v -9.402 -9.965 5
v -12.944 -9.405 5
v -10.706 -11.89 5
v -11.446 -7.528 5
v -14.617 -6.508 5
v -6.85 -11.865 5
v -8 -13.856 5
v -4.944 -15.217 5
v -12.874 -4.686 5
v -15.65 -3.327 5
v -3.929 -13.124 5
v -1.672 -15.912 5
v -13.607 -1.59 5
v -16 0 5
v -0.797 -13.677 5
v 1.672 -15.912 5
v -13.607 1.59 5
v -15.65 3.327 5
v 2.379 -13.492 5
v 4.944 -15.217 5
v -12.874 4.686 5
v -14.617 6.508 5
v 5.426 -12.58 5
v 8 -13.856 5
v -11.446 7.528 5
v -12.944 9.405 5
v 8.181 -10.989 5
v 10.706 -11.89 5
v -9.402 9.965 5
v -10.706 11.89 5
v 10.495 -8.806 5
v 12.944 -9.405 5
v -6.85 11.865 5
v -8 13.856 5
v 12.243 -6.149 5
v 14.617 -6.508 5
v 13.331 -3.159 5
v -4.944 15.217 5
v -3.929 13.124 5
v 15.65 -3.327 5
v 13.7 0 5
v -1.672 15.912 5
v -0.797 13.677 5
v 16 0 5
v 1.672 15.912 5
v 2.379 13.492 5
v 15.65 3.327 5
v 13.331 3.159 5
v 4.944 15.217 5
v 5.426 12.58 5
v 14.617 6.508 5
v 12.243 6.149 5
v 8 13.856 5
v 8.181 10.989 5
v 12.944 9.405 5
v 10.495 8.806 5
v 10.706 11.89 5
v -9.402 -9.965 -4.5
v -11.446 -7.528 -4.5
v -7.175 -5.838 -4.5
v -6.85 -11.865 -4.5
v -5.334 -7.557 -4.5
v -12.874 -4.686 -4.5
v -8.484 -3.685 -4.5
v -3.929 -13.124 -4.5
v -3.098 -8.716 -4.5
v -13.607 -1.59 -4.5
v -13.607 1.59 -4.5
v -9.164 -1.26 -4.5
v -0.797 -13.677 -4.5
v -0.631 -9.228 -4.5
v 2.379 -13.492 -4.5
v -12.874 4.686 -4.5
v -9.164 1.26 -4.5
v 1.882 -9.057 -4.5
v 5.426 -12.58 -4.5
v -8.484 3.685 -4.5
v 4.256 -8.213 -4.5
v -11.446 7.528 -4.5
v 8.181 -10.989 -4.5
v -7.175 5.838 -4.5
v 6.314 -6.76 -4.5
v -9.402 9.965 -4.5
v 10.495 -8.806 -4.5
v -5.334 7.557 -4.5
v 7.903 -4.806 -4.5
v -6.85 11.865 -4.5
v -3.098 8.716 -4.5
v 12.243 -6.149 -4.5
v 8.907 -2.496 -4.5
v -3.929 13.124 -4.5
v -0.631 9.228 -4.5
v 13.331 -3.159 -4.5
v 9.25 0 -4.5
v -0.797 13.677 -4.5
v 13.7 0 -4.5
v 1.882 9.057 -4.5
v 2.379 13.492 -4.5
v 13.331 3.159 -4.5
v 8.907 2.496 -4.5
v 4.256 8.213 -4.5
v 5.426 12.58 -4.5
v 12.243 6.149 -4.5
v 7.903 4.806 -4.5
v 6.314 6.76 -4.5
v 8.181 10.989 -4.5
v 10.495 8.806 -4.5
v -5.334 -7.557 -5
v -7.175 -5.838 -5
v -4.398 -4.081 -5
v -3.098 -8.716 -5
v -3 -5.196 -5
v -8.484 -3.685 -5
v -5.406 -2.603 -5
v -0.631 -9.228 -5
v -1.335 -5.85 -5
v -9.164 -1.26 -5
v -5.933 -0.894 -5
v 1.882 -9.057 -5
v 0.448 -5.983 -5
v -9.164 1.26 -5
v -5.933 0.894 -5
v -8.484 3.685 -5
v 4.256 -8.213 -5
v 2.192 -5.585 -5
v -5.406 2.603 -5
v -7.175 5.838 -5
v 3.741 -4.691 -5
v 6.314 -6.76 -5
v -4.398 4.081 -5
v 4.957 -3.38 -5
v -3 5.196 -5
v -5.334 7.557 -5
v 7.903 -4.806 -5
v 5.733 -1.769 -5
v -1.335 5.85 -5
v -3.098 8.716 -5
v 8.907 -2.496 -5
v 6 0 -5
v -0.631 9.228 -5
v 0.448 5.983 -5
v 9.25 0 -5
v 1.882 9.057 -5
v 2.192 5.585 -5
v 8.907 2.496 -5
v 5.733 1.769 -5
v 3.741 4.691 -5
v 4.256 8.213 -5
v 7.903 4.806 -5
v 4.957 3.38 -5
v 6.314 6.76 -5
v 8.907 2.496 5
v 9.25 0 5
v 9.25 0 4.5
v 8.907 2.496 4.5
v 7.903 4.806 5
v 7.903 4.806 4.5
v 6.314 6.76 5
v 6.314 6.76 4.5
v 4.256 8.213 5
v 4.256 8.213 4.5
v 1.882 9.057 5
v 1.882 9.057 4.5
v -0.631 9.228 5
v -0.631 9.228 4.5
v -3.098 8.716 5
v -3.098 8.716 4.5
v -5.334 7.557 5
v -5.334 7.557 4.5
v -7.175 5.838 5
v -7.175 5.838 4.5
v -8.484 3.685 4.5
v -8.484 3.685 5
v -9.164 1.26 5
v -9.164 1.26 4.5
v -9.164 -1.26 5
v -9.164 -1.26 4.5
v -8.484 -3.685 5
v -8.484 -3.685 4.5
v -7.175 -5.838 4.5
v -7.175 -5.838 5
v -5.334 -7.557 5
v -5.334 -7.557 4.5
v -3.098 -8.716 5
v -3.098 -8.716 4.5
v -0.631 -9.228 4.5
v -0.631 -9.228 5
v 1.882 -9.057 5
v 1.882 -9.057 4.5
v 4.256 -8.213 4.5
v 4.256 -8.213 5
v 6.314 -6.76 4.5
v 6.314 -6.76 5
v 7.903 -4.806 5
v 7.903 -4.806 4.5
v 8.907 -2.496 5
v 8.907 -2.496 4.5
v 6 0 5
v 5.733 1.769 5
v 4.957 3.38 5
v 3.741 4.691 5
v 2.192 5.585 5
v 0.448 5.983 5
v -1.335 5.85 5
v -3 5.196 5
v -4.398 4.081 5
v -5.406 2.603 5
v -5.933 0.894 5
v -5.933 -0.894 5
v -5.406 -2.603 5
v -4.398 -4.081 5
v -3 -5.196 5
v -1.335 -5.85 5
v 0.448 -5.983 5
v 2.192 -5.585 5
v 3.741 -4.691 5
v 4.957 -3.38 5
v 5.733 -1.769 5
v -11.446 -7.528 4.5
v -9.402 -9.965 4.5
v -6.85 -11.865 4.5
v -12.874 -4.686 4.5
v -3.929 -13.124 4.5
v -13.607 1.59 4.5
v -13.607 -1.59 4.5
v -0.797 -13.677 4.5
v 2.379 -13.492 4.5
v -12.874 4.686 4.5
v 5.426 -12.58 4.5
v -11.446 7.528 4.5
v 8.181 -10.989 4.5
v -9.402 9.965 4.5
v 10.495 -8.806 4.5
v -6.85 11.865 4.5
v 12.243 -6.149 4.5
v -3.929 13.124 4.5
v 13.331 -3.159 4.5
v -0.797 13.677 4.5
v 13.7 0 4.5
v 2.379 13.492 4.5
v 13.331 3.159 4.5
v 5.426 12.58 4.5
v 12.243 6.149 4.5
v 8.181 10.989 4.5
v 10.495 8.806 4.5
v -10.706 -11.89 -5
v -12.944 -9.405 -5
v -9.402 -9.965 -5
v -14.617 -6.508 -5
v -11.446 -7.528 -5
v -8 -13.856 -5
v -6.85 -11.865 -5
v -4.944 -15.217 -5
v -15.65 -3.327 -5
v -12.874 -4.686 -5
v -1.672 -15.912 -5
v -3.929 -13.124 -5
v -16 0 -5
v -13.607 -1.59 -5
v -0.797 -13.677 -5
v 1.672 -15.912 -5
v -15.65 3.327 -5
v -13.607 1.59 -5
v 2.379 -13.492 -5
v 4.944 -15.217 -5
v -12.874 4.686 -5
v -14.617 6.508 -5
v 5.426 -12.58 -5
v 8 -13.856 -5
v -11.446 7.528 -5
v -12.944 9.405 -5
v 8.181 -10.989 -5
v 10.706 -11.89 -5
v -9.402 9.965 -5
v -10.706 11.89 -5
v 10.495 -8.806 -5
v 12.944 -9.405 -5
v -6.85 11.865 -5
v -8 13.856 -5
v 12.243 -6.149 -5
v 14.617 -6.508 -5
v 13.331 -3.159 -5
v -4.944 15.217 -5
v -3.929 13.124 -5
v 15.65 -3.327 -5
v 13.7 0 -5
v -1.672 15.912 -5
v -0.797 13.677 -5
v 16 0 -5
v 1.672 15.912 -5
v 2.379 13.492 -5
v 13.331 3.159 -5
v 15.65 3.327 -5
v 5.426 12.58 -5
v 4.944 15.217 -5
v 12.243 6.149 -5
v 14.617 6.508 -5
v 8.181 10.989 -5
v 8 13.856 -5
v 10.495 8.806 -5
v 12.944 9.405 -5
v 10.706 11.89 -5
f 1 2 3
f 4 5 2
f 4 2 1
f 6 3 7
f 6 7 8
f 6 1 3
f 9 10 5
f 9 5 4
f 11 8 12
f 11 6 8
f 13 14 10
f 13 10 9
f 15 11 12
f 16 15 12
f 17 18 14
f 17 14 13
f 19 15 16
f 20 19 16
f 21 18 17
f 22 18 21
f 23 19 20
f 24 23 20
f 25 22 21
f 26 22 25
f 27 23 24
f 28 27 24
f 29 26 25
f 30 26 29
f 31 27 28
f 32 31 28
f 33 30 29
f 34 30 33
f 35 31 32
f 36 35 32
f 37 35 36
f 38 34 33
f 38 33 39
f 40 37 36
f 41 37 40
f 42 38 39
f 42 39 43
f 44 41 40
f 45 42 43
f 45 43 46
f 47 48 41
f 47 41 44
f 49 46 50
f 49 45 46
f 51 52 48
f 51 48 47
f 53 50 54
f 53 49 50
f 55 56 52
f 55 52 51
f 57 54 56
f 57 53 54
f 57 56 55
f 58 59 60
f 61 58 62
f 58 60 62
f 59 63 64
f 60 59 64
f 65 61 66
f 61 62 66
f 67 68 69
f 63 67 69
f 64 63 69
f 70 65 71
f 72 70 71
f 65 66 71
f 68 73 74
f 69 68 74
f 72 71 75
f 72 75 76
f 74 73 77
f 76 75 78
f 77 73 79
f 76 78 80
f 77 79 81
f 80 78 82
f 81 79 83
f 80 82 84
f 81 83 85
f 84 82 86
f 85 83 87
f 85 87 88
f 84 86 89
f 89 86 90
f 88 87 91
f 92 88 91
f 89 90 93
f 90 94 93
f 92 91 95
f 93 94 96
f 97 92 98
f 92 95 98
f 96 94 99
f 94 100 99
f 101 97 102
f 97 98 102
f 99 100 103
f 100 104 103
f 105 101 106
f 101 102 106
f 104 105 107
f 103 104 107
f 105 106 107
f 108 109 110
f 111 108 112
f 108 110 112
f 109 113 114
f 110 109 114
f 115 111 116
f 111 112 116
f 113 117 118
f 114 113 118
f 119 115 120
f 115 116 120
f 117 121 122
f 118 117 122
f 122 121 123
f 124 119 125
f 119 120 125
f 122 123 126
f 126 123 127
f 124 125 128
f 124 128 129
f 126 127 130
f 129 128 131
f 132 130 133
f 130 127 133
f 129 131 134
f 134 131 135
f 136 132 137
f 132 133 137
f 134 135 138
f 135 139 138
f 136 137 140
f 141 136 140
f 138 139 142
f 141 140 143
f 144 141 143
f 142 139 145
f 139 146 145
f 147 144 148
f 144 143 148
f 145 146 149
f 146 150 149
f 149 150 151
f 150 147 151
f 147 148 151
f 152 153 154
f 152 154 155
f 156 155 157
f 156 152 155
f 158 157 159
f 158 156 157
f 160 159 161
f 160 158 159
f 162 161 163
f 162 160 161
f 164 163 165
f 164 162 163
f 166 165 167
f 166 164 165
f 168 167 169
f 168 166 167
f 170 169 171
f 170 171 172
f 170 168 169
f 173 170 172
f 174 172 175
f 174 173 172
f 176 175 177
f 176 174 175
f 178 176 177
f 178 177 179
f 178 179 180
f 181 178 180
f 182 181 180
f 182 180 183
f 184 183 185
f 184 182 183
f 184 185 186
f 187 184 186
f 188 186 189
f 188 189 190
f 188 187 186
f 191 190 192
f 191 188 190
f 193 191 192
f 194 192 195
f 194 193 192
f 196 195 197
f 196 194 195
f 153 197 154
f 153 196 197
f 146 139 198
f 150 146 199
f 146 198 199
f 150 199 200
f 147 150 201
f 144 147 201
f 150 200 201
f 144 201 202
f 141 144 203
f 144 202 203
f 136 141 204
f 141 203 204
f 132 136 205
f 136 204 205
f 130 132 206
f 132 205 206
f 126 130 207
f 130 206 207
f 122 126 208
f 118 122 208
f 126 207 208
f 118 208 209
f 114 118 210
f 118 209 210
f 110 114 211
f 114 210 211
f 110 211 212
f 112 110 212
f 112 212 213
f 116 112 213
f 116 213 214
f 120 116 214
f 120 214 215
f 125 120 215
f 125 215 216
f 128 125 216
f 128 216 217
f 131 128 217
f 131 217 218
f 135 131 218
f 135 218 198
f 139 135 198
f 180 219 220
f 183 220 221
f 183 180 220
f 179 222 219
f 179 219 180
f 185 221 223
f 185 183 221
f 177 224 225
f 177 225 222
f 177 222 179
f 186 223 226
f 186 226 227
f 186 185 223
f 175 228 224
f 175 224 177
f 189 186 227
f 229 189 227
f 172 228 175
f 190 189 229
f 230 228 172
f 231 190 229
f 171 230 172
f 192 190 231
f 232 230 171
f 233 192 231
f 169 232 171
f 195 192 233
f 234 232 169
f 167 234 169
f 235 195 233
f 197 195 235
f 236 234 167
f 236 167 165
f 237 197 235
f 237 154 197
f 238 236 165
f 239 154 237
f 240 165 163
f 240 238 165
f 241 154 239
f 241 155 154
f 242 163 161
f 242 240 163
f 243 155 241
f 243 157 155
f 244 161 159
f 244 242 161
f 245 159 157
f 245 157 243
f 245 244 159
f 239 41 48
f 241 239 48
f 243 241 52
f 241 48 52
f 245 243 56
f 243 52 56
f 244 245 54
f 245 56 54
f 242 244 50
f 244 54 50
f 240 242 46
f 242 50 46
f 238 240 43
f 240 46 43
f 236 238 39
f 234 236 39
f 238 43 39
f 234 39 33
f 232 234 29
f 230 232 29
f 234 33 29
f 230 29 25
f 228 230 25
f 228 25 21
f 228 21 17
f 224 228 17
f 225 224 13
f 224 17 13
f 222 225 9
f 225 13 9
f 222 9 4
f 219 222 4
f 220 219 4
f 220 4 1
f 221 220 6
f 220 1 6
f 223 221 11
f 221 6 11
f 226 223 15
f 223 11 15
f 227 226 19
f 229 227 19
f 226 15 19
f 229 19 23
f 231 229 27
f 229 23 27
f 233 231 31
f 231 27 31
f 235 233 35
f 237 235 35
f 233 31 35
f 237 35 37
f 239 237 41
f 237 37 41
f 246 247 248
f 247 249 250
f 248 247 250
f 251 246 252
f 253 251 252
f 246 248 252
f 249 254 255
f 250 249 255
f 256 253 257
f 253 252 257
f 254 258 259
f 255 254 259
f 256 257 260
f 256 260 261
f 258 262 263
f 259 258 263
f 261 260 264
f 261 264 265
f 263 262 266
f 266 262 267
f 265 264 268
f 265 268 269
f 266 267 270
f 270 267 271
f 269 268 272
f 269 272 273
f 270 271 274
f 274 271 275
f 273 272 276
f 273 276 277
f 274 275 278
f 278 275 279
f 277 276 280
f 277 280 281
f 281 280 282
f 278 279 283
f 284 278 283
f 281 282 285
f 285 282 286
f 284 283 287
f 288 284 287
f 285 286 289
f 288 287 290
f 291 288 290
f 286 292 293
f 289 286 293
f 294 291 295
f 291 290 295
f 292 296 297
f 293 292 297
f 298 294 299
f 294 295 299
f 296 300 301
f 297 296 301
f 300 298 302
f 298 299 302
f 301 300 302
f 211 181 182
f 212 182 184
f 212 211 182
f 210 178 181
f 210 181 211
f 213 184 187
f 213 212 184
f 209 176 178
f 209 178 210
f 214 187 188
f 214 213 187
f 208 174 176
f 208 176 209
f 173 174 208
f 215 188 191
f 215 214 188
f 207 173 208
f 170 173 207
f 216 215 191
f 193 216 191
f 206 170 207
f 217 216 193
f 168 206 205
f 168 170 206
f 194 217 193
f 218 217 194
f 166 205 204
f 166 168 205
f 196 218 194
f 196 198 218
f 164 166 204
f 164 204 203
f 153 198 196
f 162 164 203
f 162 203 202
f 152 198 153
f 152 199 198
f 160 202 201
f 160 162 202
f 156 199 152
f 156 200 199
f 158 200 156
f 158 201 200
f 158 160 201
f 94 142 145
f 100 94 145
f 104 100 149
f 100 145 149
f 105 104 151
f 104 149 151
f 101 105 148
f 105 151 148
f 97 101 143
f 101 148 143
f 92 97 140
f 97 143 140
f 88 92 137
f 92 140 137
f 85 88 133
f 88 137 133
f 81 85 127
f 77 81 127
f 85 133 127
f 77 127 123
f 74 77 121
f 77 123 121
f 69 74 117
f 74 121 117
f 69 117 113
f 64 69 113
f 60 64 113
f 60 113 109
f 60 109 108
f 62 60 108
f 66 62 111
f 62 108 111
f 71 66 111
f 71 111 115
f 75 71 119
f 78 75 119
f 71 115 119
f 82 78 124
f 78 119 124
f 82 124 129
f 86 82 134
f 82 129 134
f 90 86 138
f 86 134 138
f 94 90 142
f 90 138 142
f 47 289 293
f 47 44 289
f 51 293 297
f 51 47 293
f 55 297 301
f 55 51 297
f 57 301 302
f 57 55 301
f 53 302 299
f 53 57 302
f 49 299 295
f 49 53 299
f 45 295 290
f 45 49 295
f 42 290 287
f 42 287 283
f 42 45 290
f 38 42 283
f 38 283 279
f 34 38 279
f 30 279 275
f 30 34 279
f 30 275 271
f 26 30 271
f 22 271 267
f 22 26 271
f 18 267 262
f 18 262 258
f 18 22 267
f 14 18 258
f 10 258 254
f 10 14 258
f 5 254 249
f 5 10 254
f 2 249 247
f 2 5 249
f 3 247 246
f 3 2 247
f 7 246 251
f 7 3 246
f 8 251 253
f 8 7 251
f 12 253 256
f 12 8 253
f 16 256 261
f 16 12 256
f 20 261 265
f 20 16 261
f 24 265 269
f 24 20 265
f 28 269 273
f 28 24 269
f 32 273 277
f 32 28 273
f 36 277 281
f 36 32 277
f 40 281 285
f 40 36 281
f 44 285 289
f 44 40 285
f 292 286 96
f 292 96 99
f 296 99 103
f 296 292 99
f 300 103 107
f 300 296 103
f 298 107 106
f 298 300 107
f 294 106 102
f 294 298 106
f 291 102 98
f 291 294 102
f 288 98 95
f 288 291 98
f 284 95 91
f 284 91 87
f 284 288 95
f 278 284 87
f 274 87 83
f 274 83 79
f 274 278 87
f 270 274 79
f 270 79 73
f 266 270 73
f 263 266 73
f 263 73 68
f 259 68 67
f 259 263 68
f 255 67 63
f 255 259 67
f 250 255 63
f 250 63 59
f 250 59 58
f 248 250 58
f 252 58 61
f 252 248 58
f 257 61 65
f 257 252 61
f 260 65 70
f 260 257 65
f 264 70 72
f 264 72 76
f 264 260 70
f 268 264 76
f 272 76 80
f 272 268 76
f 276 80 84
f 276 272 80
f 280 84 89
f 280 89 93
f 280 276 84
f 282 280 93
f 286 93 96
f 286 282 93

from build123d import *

# Parameters (mm, degrees)
SKETCH_1_R          = 16
EXTRUDE_1_DEPTH     = 5
SKETCH_2_R          = 6
CUT_EXTRUDE_1_DEPTH = 11
SKETCH_3_R          = 13.7
SKETCH_3_R_2        = 9.25
CUT_EXTRUDE_2_DEPTH = 0.5


with BuildPart() as part:
    # 草圖1 → 填料-伸長1 (new body, symmetric)
    with BuildSketch(Plane.XY):
        Circle(SKETCH_1_R)
    extrude(amount=EXTRUDE_1_DEPTH, both=True)

    # 草圖2 → 除料-伸長1 (cut, through all)
    with BuildSketch(Plane.XY.offset(5)):
        Circle(SKETCH_2_R)
    extrude(amount=-CUT_EXTRUDE_1_DEPTH, mode=Mode.SUBTRACT)

    # 草圖3 → 除料-伸長2 (cut)
    with BuildSketch(Plane.XY.offset(5)):
        Circle(SKETCH_3_R)
        Circle(SKETCH_3_R_2, mode=Mode.SUBTRACT)
    cut_extrude_2 = extrude(amount=-CUT_EXTRUDE_2_DEPTH, mode=Mode.SUBTRACT)

    # 鏡射1: 除料-伸長2 across plane
    add(cut_extrude_2.mirror(Plane.XY), mode=Mode.SUBTRACT)


solid = part.part
